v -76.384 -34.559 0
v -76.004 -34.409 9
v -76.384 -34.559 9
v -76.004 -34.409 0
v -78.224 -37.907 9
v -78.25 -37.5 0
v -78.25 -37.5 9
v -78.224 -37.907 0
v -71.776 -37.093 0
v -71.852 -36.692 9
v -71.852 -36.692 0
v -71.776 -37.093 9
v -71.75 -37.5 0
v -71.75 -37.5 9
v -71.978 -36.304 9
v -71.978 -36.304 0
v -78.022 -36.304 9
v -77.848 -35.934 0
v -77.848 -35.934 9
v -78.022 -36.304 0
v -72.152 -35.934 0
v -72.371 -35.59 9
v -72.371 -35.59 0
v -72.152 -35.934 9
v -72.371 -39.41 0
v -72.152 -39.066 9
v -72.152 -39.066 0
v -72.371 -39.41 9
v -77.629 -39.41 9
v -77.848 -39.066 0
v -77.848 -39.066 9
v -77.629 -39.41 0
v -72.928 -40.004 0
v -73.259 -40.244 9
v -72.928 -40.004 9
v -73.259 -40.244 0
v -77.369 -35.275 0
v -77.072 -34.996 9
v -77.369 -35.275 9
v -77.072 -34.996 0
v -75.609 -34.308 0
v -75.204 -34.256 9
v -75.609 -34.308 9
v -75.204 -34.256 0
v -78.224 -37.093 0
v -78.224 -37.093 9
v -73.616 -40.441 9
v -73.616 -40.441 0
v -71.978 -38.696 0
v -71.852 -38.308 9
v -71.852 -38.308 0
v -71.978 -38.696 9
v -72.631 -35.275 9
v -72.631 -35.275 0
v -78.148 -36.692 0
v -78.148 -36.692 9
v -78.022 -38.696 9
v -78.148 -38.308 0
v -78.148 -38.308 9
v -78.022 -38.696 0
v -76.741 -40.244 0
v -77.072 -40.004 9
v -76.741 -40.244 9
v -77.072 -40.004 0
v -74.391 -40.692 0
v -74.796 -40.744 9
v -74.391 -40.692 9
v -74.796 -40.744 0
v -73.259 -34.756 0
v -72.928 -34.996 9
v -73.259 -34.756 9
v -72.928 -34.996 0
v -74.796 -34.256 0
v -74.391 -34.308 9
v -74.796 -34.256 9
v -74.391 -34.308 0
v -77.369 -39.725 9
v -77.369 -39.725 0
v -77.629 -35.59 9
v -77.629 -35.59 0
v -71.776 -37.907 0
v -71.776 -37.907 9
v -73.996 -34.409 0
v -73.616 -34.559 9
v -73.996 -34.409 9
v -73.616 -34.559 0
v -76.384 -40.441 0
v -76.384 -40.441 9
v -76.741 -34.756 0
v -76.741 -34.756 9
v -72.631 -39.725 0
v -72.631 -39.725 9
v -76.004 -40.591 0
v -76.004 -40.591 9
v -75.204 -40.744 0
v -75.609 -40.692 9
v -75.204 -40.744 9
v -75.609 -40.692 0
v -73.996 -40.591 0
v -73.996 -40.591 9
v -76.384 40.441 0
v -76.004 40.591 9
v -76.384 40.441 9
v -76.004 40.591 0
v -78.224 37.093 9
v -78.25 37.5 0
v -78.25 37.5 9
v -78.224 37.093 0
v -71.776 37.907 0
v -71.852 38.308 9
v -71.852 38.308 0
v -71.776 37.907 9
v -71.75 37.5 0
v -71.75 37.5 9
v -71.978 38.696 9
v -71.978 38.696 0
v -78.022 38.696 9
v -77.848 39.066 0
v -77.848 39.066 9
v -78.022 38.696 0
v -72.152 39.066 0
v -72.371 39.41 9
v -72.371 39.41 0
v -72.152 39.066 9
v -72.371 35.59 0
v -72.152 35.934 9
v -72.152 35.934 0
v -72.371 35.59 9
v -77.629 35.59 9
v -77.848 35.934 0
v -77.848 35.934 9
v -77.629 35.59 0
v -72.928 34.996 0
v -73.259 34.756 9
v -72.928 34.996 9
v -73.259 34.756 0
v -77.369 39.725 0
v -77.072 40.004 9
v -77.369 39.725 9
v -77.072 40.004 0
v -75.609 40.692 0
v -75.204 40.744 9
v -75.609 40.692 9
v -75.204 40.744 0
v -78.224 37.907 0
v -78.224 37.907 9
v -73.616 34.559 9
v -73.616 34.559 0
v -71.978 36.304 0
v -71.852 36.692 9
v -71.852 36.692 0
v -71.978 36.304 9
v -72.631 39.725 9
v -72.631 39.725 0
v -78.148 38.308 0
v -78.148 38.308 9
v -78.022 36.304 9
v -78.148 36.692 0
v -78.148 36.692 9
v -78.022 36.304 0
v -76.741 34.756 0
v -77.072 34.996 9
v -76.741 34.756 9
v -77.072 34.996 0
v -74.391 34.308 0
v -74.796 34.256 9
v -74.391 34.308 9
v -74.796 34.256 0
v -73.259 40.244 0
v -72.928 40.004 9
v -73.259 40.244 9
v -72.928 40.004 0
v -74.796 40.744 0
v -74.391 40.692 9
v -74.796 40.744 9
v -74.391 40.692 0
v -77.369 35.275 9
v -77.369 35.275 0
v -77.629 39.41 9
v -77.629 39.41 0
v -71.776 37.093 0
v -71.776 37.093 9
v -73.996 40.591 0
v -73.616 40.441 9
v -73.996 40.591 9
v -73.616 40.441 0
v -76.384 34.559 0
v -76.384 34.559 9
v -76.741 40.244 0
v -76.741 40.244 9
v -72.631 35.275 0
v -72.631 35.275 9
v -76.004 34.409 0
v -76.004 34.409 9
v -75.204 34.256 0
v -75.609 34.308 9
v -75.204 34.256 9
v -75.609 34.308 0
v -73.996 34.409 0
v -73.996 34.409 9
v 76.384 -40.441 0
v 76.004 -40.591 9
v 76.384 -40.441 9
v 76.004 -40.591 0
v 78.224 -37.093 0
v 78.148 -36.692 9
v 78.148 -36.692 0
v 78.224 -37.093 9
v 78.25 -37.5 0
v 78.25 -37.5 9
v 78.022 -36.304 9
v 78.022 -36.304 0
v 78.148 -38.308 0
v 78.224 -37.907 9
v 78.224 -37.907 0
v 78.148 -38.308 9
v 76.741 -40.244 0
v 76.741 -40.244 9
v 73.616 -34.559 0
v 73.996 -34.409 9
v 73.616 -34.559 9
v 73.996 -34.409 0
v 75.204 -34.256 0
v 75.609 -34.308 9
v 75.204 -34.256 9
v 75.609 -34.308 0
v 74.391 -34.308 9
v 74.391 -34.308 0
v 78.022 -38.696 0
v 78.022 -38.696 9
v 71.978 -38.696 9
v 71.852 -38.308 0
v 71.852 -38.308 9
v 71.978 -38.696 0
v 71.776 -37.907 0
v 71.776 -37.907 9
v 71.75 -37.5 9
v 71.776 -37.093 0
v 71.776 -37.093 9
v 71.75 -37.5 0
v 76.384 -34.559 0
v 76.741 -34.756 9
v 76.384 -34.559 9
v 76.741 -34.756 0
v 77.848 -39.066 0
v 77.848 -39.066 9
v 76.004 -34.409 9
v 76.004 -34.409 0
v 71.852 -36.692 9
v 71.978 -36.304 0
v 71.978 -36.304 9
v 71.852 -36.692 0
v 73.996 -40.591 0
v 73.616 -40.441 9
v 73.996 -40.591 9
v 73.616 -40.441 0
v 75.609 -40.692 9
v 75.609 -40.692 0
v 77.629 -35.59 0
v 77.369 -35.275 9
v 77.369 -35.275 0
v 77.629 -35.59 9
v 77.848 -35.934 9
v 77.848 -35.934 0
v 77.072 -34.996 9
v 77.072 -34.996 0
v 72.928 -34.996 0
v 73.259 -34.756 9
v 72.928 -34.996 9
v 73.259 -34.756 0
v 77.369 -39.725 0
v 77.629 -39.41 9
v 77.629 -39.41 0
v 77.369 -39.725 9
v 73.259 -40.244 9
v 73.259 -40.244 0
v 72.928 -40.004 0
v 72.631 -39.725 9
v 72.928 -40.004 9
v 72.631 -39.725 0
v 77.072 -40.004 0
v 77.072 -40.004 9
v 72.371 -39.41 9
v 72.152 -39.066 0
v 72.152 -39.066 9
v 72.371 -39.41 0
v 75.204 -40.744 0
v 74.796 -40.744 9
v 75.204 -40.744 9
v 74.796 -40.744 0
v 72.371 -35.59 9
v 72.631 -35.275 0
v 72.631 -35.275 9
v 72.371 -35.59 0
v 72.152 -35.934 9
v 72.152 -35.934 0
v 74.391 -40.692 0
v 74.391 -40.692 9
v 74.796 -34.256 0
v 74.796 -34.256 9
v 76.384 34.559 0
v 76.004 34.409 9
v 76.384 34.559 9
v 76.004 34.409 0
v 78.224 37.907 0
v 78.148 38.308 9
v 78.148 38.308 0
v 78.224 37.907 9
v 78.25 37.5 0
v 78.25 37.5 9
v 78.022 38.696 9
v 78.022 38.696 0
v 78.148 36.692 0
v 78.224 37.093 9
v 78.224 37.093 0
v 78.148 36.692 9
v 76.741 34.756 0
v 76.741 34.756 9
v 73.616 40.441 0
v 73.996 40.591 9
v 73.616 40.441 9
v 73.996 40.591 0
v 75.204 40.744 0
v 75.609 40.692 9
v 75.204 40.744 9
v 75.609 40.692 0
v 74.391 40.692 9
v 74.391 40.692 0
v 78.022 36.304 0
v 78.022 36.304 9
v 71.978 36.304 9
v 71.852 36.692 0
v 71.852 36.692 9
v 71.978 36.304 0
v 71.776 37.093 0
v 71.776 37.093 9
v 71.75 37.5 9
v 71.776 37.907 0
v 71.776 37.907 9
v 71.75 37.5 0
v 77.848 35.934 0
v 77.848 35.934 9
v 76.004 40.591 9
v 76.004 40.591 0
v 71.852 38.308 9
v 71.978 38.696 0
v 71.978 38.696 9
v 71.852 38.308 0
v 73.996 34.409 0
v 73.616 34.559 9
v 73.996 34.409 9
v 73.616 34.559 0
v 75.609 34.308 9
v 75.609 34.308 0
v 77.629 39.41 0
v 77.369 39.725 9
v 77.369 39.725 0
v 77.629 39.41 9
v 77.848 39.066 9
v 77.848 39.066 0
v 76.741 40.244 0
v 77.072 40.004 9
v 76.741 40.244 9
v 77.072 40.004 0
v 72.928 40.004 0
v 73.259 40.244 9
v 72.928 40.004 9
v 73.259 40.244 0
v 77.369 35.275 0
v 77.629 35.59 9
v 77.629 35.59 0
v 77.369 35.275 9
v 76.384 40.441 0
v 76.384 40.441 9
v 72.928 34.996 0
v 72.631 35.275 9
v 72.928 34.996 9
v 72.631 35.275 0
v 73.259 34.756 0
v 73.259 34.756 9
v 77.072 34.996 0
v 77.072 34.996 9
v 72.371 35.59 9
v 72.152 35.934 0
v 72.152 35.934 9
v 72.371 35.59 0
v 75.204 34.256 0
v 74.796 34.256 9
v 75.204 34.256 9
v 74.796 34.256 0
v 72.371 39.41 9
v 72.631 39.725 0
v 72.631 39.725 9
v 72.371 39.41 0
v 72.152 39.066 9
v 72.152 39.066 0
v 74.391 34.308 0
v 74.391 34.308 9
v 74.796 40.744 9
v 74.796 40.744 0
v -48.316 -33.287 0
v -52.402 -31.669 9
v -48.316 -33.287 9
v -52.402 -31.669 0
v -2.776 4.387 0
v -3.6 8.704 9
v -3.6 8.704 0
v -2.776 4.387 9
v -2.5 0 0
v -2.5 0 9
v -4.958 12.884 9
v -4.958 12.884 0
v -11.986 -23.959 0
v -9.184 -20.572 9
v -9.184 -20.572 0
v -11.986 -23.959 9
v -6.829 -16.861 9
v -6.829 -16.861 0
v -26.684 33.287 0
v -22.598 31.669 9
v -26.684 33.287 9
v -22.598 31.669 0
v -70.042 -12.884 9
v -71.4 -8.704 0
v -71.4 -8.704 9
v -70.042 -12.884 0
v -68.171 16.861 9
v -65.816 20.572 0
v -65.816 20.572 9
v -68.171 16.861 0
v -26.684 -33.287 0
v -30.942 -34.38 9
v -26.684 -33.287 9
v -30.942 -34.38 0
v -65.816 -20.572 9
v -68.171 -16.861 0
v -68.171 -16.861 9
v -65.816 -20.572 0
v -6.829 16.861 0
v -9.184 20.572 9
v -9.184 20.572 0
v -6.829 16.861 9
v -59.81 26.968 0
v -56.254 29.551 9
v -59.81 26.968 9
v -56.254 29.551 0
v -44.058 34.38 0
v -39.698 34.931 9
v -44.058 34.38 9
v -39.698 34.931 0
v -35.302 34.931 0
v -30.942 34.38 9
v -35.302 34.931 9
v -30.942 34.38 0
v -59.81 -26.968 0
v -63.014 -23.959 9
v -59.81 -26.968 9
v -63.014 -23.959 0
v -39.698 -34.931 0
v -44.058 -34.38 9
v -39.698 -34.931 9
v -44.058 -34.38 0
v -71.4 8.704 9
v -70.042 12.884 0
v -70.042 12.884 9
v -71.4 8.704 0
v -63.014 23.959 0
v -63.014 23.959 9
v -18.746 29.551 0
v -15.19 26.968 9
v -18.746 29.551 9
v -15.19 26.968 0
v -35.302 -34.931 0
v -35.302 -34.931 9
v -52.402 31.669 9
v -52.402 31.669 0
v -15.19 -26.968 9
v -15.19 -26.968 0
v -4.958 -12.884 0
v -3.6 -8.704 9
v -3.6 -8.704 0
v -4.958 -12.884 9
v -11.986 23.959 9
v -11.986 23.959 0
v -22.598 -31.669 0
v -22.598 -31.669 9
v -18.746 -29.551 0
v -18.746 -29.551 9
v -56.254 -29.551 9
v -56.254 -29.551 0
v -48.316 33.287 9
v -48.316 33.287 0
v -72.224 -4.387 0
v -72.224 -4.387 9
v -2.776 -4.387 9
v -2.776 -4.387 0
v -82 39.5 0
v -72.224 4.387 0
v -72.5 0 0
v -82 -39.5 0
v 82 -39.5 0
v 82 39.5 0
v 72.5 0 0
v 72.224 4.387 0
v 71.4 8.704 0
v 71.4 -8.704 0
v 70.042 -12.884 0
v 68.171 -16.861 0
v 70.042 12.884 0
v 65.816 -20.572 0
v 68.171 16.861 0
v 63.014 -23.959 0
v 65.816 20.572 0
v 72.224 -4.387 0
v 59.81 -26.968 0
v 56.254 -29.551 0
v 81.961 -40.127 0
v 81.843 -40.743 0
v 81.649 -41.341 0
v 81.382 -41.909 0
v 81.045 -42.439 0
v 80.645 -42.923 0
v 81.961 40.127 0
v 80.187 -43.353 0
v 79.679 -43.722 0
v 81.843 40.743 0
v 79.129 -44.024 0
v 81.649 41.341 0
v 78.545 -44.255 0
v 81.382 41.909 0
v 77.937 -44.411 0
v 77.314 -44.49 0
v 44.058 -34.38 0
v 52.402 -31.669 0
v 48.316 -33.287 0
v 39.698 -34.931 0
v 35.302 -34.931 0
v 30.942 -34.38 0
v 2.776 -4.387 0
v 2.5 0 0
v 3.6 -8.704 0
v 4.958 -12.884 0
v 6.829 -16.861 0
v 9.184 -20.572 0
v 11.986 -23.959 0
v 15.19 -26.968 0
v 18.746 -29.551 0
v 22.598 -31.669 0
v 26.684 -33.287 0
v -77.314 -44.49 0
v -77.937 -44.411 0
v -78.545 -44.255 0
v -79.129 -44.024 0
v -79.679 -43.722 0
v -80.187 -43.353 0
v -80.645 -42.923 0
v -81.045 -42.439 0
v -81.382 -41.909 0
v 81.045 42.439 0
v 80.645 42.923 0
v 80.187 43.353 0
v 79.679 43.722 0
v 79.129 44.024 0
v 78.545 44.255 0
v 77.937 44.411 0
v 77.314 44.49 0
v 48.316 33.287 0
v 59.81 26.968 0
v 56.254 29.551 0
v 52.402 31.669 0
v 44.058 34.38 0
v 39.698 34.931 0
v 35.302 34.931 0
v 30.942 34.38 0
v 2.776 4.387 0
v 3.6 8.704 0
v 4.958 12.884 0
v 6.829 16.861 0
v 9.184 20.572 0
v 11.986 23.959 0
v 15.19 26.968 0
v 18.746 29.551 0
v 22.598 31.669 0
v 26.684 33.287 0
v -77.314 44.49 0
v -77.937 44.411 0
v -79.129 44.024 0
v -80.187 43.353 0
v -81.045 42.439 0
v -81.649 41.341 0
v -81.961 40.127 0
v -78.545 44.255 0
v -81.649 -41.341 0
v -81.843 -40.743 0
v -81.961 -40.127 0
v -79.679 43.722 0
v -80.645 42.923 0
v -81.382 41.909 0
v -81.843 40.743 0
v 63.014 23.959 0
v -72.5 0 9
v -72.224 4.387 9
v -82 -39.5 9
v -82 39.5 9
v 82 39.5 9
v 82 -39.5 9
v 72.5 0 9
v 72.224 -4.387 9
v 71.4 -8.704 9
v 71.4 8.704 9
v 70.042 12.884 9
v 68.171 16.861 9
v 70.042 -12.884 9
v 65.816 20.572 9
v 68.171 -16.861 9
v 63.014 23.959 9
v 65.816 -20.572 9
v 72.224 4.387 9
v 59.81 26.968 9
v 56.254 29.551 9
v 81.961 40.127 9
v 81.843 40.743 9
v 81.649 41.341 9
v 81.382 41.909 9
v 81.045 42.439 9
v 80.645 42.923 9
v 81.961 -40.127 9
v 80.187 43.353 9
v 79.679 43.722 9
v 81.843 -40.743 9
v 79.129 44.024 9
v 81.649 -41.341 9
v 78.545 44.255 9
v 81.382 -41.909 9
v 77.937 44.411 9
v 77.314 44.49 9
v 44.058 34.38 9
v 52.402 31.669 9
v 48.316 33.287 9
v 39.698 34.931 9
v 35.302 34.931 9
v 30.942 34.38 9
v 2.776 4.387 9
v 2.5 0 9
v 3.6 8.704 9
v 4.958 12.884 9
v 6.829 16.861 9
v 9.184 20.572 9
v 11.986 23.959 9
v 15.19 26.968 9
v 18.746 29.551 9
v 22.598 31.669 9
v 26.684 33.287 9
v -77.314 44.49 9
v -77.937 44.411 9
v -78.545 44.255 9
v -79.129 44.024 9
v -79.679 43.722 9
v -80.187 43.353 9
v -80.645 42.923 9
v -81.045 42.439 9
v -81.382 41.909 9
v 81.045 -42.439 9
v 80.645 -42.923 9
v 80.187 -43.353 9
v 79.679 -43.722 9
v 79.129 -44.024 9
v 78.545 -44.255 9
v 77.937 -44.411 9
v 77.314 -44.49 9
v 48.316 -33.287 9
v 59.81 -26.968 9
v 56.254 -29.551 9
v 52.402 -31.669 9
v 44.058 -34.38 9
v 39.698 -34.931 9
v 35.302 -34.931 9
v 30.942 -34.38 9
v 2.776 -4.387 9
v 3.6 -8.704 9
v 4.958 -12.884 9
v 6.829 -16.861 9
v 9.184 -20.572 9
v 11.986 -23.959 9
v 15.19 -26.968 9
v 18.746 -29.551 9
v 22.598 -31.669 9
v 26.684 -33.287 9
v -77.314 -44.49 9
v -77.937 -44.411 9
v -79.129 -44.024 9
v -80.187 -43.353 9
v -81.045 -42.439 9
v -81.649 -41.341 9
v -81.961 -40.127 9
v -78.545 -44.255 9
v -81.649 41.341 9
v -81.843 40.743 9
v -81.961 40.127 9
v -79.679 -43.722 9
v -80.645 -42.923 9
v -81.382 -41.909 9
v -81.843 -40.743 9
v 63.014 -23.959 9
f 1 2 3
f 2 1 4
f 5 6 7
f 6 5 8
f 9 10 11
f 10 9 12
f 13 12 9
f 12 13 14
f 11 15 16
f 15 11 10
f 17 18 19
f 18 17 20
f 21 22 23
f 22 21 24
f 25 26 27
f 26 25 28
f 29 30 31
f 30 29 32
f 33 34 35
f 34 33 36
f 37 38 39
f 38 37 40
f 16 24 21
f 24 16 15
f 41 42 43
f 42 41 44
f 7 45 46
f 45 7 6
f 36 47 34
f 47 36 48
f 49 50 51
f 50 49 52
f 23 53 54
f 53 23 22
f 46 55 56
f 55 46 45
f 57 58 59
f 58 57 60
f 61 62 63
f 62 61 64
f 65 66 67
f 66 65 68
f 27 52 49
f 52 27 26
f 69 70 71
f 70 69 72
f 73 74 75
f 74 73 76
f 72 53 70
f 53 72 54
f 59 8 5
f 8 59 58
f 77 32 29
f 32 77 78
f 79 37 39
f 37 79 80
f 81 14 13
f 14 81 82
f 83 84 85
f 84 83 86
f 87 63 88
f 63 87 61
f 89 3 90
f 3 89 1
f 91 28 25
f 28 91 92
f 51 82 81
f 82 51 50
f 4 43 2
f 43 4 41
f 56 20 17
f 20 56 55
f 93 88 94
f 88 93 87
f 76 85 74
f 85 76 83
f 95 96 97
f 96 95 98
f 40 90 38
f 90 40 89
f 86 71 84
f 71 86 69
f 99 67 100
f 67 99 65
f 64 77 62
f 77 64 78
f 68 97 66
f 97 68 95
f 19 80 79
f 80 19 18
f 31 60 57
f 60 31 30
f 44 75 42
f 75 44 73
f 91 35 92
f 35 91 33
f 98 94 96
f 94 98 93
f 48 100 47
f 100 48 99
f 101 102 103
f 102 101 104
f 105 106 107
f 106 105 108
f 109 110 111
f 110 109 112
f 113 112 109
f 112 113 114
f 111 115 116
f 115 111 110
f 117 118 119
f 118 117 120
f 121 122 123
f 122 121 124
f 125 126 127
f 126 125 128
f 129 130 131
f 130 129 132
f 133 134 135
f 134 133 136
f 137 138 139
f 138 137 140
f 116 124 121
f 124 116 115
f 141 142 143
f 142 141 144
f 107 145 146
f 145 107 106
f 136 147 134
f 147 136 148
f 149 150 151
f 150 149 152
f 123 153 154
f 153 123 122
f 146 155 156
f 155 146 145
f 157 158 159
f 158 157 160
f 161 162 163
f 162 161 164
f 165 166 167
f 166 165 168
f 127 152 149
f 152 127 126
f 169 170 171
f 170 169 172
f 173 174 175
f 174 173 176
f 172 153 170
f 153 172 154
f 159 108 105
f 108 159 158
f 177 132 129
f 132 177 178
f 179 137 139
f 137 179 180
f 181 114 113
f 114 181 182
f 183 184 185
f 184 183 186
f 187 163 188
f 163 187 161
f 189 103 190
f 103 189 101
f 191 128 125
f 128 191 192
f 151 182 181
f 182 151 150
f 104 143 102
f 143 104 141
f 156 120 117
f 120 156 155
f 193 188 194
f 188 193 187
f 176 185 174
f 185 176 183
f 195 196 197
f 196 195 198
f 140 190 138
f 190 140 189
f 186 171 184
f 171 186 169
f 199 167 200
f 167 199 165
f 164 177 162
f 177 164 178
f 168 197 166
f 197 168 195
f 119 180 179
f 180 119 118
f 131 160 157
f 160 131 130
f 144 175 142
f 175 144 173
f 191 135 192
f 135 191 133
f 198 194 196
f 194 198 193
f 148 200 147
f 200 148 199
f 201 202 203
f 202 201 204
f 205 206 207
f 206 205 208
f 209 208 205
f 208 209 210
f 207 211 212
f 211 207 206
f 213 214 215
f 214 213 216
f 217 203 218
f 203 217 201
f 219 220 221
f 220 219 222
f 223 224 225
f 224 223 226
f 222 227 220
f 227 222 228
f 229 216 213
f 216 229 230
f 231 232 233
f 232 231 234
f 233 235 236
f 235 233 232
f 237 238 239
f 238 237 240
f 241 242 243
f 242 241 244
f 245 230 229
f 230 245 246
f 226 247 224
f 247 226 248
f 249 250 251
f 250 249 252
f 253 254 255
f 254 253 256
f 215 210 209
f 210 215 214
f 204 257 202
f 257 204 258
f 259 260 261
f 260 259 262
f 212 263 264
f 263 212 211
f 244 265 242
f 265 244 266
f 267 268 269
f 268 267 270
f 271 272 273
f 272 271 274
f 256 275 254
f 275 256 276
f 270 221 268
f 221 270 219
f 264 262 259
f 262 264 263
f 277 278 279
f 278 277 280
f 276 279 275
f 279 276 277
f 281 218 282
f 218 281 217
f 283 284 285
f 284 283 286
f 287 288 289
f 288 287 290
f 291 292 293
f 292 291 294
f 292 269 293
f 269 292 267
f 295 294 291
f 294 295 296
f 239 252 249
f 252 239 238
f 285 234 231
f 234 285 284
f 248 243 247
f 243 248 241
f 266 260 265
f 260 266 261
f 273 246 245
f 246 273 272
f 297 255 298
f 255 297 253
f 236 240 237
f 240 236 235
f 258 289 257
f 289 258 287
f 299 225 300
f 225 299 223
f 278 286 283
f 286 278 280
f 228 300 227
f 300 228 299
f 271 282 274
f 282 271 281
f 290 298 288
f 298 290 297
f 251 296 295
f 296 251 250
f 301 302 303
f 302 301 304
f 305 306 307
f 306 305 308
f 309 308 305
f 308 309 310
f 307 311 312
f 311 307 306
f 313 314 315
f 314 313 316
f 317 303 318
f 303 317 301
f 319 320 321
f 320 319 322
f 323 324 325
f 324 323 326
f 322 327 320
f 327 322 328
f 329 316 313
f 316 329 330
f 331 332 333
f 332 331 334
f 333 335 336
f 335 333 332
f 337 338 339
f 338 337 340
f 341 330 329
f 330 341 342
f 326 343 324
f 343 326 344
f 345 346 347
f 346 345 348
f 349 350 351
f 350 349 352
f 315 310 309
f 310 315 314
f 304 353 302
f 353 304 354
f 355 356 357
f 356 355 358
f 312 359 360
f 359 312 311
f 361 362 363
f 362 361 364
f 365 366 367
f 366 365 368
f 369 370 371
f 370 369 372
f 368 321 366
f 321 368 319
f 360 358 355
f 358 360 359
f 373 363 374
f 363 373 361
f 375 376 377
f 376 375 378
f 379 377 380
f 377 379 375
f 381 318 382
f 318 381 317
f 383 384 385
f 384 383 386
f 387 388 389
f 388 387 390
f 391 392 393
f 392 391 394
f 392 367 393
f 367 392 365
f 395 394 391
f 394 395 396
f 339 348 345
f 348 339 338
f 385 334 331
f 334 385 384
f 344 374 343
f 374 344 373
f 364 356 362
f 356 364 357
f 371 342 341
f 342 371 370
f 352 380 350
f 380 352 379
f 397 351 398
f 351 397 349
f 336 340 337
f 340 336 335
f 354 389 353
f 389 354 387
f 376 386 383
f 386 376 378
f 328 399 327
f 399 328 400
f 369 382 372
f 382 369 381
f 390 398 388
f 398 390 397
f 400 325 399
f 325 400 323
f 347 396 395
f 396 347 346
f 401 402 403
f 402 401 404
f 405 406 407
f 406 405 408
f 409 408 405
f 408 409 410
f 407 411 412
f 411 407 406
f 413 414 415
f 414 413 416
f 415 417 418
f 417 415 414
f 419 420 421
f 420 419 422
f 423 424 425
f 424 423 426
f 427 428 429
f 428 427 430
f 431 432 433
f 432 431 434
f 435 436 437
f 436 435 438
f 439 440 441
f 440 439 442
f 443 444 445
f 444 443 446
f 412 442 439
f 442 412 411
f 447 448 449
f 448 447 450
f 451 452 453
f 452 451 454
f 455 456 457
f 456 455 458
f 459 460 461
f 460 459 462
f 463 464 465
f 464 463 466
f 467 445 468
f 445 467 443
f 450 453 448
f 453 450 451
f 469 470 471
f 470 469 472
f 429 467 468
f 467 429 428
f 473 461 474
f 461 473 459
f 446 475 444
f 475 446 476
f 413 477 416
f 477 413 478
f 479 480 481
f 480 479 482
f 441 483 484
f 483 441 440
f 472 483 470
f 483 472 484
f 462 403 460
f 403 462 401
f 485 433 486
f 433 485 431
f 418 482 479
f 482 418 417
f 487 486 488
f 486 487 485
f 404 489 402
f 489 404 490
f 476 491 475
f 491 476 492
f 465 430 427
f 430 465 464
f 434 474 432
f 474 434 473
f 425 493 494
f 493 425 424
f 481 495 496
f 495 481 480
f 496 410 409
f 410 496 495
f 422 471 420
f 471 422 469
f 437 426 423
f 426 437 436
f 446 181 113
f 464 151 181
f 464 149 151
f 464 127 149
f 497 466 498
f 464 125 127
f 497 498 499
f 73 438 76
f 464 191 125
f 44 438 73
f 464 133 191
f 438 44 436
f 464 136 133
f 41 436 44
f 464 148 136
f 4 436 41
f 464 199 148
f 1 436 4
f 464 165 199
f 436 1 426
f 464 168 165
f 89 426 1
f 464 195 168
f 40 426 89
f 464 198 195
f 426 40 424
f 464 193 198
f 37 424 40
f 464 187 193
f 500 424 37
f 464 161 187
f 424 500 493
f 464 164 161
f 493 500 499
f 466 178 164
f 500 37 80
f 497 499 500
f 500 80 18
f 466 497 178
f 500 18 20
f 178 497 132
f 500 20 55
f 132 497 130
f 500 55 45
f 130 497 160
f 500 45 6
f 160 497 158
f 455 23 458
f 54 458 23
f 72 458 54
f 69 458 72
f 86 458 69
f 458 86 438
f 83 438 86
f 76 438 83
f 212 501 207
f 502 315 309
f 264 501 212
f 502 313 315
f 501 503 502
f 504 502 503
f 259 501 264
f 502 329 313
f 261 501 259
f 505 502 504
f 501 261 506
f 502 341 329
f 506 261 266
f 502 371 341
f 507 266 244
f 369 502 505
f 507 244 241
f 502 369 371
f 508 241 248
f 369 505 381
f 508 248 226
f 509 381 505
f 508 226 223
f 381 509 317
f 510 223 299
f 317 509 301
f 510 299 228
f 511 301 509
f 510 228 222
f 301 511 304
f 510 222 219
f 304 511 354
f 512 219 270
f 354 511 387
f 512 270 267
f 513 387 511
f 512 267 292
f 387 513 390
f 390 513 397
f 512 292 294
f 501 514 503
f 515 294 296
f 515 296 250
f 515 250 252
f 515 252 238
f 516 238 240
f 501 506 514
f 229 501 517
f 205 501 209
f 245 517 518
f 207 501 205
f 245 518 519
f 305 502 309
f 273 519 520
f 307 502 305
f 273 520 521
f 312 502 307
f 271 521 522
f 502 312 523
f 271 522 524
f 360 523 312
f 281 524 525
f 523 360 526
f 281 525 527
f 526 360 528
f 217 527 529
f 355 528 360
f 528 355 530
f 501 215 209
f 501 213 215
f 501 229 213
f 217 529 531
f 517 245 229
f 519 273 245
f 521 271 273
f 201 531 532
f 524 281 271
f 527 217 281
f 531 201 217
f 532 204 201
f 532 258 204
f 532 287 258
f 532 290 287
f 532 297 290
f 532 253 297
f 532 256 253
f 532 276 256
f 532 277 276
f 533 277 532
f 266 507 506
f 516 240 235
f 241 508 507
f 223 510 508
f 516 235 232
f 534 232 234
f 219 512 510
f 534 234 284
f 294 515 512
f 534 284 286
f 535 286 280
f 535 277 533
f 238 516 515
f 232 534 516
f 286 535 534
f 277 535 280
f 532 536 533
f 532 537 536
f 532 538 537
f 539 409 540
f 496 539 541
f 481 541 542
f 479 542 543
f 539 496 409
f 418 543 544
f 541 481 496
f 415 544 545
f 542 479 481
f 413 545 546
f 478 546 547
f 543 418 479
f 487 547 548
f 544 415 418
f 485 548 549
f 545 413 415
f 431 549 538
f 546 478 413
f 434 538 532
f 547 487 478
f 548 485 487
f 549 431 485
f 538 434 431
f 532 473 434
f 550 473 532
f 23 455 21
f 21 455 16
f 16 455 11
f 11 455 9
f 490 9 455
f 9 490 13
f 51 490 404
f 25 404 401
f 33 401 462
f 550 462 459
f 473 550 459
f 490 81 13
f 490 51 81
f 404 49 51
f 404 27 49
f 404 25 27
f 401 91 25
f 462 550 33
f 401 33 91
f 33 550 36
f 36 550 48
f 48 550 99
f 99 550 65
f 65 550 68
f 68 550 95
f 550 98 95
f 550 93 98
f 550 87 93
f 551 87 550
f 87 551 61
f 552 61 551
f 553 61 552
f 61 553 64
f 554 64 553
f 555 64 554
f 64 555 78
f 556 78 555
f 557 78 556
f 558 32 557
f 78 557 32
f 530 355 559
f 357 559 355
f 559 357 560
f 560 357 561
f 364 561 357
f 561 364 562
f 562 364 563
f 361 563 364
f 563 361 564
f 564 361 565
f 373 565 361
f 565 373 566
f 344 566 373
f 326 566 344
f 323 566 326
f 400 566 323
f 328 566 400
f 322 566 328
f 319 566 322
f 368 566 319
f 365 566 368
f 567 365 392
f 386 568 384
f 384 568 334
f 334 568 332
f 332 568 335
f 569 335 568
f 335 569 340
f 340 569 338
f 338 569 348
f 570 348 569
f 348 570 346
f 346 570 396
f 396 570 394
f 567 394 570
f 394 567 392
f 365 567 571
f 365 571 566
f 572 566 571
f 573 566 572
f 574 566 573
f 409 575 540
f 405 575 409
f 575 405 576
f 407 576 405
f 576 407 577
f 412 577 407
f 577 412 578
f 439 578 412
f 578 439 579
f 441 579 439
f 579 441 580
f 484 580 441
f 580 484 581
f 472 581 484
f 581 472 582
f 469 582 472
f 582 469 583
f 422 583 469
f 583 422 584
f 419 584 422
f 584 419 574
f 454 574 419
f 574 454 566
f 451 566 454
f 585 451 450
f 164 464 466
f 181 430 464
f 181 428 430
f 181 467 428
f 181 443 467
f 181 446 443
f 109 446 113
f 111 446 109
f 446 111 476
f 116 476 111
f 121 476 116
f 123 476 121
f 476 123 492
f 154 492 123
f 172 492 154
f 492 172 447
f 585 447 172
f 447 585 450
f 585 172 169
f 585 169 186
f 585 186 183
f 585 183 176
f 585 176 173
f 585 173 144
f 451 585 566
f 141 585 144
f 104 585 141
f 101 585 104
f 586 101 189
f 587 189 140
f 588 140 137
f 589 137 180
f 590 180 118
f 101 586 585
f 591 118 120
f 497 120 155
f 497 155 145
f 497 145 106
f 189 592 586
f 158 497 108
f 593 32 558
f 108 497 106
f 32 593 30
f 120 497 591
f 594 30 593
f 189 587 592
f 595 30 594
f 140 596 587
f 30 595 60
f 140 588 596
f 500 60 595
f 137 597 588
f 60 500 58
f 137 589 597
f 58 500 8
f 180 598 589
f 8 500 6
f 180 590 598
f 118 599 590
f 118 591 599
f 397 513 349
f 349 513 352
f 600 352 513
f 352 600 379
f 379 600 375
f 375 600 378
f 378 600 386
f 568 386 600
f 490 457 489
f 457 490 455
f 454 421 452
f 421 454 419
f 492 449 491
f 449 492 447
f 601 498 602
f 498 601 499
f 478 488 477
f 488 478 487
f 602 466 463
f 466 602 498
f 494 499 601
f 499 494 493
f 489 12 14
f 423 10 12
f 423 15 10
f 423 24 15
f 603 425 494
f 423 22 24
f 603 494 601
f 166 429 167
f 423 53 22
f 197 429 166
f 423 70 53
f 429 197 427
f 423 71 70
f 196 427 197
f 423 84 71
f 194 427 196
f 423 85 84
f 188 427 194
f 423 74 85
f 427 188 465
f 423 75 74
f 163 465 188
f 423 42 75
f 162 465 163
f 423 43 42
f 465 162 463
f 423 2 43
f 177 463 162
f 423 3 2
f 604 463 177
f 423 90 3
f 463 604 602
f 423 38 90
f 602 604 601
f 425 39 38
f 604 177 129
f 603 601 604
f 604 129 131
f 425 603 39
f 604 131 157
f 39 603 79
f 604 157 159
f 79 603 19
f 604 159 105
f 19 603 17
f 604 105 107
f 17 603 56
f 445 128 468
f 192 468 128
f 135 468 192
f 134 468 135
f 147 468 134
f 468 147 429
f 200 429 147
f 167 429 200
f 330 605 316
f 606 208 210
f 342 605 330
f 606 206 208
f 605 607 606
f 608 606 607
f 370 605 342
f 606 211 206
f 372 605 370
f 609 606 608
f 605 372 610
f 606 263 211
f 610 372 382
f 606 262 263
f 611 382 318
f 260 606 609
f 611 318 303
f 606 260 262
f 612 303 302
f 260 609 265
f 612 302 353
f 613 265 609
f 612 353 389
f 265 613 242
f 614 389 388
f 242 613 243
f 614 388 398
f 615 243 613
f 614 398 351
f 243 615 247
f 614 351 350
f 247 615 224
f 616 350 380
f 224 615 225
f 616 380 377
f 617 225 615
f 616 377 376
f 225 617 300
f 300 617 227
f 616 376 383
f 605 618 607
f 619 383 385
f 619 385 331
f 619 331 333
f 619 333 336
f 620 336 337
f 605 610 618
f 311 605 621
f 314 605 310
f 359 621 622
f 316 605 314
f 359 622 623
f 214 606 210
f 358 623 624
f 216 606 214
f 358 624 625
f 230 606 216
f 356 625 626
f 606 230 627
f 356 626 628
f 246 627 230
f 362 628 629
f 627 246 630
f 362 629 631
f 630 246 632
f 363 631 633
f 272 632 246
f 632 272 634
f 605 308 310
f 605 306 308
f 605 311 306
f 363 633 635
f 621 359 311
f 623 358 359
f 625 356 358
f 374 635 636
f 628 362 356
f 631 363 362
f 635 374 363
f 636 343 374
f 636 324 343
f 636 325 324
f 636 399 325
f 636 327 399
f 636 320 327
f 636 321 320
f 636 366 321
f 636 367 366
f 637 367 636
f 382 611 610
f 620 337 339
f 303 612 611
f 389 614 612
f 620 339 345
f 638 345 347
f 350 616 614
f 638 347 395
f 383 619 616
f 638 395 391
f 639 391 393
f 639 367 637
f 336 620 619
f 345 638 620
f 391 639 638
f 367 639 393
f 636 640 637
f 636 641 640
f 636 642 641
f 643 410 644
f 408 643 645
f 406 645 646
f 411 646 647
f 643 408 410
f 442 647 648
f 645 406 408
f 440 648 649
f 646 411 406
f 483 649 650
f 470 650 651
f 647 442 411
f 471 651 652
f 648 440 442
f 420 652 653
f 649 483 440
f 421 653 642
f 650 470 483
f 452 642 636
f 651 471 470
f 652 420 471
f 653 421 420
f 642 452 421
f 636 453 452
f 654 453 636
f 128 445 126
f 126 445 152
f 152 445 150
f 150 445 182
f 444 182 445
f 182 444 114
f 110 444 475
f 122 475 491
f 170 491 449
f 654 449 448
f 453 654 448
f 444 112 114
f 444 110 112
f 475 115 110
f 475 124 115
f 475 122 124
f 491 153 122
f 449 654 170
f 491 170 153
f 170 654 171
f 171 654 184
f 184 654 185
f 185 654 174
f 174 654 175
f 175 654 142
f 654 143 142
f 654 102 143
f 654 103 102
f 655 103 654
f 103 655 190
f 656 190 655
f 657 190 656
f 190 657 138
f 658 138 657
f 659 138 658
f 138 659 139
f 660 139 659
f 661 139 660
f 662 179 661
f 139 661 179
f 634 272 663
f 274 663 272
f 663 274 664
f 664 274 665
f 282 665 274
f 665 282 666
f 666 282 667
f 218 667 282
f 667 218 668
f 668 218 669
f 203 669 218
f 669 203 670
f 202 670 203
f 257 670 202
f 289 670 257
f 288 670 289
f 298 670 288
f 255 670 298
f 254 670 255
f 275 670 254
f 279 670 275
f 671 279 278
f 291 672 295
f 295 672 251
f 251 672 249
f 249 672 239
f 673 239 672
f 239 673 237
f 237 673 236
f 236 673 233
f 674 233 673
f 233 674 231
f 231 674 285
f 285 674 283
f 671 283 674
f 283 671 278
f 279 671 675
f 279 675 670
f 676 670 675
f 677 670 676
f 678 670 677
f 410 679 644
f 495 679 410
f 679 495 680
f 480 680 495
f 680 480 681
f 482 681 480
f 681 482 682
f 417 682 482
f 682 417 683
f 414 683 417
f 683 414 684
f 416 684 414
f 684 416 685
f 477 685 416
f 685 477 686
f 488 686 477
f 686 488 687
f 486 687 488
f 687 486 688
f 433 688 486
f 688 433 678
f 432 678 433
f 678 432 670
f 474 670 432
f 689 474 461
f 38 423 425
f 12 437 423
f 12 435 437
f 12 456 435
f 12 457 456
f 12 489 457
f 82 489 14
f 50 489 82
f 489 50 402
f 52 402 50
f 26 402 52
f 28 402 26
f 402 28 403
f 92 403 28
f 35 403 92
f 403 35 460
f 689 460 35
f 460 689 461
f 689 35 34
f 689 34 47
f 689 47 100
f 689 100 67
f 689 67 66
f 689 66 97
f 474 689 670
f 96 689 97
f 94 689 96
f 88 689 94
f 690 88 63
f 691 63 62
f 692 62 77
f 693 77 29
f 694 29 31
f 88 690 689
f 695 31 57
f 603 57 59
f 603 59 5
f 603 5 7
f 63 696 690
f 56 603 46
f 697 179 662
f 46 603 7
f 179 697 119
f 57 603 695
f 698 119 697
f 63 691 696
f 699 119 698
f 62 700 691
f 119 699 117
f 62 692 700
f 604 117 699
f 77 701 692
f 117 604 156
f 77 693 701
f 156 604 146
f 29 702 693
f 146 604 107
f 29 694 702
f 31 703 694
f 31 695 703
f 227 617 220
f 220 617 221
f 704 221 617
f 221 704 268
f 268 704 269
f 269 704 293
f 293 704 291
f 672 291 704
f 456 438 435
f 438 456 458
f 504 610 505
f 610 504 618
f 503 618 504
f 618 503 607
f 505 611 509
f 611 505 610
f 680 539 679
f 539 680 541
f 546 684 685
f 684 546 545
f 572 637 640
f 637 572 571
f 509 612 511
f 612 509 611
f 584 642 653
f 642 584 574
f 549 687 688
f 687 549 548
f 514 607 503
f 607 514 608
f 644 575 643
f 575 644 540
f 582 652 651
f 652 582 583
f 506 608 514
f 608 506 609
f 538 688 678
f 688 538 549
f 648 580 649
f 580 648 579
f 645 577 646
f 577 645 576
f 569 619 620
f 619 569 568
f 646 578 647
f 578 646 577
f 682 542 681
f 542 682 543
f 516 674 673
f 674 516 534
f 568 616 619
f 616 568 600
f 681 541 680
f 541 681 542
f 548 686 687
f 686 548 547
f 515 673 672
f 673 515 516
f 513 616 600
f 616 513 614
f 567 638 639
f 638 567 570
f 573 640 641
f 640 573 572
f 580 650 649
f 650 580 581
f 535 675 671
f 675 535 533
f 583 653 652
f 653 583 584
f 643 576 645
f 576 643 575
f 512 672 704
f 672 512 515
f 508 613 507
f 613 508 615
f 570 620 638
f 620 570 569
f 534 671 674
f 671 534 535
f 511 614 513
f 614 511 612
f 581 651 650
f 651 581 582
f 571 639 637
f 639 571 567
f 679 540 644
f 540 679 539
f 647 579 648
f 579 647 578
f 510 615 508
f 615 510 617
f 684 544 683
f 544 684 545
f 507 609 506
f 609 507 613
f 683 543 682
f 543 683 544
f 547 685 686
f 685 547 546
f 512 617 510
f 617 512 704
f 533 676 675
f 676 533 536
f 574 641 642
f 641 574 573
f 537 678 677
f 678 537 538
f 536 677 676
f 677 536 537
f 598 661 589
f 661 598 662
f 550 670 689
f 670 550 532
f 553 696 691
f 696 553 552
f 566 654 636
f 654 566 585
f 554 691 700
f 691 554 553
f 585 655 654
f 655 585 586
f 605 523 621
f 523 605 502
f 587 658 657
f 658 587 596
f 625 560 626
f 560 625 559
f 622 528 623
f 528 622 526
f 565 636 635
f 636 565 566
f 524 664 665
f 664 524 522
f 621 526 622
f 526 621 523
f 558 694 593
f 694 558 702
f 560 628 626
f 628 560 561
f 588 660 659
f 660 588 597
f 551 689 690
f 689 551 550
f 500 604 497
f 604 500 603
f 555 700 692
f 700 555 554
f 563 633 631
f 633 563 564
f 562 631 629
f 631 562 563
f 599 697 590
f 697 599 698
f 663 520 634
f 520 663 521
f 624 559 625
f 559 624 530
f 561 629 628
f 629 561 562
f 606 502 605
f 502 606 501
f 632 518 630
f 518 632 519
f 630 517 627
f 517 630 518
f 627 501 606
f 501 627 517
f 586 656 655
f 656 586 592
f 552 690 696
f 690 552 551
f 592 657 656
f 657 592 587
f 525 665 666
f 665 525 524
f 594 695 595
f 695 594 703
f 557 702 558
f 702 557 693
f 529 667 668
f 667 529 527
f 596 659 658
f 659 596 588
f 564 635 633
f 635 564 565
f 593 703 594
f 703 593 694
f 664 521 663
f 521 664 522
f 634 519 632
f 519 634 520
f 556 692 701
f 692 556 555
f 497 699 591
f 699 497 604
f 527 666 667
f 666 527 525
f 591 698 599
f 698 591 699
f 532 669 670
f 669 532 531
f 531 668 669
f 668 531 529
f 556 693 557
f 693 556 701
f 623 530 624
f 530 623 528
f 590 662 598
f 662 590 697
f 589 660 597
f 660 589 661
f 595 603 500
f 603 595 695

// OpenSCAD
$fn = 50;

difference() {
	union() {
		hull() {
			translate(v = [-77.0, 39.5, 0]) {
				cylinder(h = 9, r = 5);
			}
			translate(v = [77.0, 39.5, 0]) {
				cylinder(h = 9, r = 5);
			}
			translate(v = [-77.0, -39.5, 0]) {
				cylinder(h = 9, r = 5);
			}
			translate(v = [77.0, -39.5, 0]) {
				cylinder(h = 9, r = 5);
			}
		}
	}
	union() {
		translate(v = [-75.0, -37.5, -100.0]) {
			cylinder(h = 200, r = 3.25);
		}
		translate(v = [-75.0, 37.5, -100.0]) {
			cylinder(h = 200, r = 3.25);
		}
		translate(v = [75.0, -37.5, -100.0]) {
			cylinder(h = 200, r = 3.25);
		}
		translate(v = [75.0, 37.5, -100.0]) {
			cylinder(h = 200, r = 3.25);
		}
		translate(v = [-75.0, -37.5, -100.0]) {
			cylinder(h = 200, r = 1.8);
		}
		translate(v = [-75.0, 37.5, -100.0]) {
			cylinder(h = 200, r = 1.8);
		}
		translate(v = [75.0, -37.5, -100.0]) {
			cylinder(h = 200, r = 1.8);
		}
		translate(v = [75.0, 37.5, -100.0]) {
			cylinder(h = 200, r = 1.8);
		}
		translate(v = [-37.5, 0, 0.0]) {
			cylinder(h = 9, r = 35.0);
		}
		translate(v = [37.5, 0, 0.0]) {
			cylinder(h = 9, r = 35.0);
		}
	}
}
